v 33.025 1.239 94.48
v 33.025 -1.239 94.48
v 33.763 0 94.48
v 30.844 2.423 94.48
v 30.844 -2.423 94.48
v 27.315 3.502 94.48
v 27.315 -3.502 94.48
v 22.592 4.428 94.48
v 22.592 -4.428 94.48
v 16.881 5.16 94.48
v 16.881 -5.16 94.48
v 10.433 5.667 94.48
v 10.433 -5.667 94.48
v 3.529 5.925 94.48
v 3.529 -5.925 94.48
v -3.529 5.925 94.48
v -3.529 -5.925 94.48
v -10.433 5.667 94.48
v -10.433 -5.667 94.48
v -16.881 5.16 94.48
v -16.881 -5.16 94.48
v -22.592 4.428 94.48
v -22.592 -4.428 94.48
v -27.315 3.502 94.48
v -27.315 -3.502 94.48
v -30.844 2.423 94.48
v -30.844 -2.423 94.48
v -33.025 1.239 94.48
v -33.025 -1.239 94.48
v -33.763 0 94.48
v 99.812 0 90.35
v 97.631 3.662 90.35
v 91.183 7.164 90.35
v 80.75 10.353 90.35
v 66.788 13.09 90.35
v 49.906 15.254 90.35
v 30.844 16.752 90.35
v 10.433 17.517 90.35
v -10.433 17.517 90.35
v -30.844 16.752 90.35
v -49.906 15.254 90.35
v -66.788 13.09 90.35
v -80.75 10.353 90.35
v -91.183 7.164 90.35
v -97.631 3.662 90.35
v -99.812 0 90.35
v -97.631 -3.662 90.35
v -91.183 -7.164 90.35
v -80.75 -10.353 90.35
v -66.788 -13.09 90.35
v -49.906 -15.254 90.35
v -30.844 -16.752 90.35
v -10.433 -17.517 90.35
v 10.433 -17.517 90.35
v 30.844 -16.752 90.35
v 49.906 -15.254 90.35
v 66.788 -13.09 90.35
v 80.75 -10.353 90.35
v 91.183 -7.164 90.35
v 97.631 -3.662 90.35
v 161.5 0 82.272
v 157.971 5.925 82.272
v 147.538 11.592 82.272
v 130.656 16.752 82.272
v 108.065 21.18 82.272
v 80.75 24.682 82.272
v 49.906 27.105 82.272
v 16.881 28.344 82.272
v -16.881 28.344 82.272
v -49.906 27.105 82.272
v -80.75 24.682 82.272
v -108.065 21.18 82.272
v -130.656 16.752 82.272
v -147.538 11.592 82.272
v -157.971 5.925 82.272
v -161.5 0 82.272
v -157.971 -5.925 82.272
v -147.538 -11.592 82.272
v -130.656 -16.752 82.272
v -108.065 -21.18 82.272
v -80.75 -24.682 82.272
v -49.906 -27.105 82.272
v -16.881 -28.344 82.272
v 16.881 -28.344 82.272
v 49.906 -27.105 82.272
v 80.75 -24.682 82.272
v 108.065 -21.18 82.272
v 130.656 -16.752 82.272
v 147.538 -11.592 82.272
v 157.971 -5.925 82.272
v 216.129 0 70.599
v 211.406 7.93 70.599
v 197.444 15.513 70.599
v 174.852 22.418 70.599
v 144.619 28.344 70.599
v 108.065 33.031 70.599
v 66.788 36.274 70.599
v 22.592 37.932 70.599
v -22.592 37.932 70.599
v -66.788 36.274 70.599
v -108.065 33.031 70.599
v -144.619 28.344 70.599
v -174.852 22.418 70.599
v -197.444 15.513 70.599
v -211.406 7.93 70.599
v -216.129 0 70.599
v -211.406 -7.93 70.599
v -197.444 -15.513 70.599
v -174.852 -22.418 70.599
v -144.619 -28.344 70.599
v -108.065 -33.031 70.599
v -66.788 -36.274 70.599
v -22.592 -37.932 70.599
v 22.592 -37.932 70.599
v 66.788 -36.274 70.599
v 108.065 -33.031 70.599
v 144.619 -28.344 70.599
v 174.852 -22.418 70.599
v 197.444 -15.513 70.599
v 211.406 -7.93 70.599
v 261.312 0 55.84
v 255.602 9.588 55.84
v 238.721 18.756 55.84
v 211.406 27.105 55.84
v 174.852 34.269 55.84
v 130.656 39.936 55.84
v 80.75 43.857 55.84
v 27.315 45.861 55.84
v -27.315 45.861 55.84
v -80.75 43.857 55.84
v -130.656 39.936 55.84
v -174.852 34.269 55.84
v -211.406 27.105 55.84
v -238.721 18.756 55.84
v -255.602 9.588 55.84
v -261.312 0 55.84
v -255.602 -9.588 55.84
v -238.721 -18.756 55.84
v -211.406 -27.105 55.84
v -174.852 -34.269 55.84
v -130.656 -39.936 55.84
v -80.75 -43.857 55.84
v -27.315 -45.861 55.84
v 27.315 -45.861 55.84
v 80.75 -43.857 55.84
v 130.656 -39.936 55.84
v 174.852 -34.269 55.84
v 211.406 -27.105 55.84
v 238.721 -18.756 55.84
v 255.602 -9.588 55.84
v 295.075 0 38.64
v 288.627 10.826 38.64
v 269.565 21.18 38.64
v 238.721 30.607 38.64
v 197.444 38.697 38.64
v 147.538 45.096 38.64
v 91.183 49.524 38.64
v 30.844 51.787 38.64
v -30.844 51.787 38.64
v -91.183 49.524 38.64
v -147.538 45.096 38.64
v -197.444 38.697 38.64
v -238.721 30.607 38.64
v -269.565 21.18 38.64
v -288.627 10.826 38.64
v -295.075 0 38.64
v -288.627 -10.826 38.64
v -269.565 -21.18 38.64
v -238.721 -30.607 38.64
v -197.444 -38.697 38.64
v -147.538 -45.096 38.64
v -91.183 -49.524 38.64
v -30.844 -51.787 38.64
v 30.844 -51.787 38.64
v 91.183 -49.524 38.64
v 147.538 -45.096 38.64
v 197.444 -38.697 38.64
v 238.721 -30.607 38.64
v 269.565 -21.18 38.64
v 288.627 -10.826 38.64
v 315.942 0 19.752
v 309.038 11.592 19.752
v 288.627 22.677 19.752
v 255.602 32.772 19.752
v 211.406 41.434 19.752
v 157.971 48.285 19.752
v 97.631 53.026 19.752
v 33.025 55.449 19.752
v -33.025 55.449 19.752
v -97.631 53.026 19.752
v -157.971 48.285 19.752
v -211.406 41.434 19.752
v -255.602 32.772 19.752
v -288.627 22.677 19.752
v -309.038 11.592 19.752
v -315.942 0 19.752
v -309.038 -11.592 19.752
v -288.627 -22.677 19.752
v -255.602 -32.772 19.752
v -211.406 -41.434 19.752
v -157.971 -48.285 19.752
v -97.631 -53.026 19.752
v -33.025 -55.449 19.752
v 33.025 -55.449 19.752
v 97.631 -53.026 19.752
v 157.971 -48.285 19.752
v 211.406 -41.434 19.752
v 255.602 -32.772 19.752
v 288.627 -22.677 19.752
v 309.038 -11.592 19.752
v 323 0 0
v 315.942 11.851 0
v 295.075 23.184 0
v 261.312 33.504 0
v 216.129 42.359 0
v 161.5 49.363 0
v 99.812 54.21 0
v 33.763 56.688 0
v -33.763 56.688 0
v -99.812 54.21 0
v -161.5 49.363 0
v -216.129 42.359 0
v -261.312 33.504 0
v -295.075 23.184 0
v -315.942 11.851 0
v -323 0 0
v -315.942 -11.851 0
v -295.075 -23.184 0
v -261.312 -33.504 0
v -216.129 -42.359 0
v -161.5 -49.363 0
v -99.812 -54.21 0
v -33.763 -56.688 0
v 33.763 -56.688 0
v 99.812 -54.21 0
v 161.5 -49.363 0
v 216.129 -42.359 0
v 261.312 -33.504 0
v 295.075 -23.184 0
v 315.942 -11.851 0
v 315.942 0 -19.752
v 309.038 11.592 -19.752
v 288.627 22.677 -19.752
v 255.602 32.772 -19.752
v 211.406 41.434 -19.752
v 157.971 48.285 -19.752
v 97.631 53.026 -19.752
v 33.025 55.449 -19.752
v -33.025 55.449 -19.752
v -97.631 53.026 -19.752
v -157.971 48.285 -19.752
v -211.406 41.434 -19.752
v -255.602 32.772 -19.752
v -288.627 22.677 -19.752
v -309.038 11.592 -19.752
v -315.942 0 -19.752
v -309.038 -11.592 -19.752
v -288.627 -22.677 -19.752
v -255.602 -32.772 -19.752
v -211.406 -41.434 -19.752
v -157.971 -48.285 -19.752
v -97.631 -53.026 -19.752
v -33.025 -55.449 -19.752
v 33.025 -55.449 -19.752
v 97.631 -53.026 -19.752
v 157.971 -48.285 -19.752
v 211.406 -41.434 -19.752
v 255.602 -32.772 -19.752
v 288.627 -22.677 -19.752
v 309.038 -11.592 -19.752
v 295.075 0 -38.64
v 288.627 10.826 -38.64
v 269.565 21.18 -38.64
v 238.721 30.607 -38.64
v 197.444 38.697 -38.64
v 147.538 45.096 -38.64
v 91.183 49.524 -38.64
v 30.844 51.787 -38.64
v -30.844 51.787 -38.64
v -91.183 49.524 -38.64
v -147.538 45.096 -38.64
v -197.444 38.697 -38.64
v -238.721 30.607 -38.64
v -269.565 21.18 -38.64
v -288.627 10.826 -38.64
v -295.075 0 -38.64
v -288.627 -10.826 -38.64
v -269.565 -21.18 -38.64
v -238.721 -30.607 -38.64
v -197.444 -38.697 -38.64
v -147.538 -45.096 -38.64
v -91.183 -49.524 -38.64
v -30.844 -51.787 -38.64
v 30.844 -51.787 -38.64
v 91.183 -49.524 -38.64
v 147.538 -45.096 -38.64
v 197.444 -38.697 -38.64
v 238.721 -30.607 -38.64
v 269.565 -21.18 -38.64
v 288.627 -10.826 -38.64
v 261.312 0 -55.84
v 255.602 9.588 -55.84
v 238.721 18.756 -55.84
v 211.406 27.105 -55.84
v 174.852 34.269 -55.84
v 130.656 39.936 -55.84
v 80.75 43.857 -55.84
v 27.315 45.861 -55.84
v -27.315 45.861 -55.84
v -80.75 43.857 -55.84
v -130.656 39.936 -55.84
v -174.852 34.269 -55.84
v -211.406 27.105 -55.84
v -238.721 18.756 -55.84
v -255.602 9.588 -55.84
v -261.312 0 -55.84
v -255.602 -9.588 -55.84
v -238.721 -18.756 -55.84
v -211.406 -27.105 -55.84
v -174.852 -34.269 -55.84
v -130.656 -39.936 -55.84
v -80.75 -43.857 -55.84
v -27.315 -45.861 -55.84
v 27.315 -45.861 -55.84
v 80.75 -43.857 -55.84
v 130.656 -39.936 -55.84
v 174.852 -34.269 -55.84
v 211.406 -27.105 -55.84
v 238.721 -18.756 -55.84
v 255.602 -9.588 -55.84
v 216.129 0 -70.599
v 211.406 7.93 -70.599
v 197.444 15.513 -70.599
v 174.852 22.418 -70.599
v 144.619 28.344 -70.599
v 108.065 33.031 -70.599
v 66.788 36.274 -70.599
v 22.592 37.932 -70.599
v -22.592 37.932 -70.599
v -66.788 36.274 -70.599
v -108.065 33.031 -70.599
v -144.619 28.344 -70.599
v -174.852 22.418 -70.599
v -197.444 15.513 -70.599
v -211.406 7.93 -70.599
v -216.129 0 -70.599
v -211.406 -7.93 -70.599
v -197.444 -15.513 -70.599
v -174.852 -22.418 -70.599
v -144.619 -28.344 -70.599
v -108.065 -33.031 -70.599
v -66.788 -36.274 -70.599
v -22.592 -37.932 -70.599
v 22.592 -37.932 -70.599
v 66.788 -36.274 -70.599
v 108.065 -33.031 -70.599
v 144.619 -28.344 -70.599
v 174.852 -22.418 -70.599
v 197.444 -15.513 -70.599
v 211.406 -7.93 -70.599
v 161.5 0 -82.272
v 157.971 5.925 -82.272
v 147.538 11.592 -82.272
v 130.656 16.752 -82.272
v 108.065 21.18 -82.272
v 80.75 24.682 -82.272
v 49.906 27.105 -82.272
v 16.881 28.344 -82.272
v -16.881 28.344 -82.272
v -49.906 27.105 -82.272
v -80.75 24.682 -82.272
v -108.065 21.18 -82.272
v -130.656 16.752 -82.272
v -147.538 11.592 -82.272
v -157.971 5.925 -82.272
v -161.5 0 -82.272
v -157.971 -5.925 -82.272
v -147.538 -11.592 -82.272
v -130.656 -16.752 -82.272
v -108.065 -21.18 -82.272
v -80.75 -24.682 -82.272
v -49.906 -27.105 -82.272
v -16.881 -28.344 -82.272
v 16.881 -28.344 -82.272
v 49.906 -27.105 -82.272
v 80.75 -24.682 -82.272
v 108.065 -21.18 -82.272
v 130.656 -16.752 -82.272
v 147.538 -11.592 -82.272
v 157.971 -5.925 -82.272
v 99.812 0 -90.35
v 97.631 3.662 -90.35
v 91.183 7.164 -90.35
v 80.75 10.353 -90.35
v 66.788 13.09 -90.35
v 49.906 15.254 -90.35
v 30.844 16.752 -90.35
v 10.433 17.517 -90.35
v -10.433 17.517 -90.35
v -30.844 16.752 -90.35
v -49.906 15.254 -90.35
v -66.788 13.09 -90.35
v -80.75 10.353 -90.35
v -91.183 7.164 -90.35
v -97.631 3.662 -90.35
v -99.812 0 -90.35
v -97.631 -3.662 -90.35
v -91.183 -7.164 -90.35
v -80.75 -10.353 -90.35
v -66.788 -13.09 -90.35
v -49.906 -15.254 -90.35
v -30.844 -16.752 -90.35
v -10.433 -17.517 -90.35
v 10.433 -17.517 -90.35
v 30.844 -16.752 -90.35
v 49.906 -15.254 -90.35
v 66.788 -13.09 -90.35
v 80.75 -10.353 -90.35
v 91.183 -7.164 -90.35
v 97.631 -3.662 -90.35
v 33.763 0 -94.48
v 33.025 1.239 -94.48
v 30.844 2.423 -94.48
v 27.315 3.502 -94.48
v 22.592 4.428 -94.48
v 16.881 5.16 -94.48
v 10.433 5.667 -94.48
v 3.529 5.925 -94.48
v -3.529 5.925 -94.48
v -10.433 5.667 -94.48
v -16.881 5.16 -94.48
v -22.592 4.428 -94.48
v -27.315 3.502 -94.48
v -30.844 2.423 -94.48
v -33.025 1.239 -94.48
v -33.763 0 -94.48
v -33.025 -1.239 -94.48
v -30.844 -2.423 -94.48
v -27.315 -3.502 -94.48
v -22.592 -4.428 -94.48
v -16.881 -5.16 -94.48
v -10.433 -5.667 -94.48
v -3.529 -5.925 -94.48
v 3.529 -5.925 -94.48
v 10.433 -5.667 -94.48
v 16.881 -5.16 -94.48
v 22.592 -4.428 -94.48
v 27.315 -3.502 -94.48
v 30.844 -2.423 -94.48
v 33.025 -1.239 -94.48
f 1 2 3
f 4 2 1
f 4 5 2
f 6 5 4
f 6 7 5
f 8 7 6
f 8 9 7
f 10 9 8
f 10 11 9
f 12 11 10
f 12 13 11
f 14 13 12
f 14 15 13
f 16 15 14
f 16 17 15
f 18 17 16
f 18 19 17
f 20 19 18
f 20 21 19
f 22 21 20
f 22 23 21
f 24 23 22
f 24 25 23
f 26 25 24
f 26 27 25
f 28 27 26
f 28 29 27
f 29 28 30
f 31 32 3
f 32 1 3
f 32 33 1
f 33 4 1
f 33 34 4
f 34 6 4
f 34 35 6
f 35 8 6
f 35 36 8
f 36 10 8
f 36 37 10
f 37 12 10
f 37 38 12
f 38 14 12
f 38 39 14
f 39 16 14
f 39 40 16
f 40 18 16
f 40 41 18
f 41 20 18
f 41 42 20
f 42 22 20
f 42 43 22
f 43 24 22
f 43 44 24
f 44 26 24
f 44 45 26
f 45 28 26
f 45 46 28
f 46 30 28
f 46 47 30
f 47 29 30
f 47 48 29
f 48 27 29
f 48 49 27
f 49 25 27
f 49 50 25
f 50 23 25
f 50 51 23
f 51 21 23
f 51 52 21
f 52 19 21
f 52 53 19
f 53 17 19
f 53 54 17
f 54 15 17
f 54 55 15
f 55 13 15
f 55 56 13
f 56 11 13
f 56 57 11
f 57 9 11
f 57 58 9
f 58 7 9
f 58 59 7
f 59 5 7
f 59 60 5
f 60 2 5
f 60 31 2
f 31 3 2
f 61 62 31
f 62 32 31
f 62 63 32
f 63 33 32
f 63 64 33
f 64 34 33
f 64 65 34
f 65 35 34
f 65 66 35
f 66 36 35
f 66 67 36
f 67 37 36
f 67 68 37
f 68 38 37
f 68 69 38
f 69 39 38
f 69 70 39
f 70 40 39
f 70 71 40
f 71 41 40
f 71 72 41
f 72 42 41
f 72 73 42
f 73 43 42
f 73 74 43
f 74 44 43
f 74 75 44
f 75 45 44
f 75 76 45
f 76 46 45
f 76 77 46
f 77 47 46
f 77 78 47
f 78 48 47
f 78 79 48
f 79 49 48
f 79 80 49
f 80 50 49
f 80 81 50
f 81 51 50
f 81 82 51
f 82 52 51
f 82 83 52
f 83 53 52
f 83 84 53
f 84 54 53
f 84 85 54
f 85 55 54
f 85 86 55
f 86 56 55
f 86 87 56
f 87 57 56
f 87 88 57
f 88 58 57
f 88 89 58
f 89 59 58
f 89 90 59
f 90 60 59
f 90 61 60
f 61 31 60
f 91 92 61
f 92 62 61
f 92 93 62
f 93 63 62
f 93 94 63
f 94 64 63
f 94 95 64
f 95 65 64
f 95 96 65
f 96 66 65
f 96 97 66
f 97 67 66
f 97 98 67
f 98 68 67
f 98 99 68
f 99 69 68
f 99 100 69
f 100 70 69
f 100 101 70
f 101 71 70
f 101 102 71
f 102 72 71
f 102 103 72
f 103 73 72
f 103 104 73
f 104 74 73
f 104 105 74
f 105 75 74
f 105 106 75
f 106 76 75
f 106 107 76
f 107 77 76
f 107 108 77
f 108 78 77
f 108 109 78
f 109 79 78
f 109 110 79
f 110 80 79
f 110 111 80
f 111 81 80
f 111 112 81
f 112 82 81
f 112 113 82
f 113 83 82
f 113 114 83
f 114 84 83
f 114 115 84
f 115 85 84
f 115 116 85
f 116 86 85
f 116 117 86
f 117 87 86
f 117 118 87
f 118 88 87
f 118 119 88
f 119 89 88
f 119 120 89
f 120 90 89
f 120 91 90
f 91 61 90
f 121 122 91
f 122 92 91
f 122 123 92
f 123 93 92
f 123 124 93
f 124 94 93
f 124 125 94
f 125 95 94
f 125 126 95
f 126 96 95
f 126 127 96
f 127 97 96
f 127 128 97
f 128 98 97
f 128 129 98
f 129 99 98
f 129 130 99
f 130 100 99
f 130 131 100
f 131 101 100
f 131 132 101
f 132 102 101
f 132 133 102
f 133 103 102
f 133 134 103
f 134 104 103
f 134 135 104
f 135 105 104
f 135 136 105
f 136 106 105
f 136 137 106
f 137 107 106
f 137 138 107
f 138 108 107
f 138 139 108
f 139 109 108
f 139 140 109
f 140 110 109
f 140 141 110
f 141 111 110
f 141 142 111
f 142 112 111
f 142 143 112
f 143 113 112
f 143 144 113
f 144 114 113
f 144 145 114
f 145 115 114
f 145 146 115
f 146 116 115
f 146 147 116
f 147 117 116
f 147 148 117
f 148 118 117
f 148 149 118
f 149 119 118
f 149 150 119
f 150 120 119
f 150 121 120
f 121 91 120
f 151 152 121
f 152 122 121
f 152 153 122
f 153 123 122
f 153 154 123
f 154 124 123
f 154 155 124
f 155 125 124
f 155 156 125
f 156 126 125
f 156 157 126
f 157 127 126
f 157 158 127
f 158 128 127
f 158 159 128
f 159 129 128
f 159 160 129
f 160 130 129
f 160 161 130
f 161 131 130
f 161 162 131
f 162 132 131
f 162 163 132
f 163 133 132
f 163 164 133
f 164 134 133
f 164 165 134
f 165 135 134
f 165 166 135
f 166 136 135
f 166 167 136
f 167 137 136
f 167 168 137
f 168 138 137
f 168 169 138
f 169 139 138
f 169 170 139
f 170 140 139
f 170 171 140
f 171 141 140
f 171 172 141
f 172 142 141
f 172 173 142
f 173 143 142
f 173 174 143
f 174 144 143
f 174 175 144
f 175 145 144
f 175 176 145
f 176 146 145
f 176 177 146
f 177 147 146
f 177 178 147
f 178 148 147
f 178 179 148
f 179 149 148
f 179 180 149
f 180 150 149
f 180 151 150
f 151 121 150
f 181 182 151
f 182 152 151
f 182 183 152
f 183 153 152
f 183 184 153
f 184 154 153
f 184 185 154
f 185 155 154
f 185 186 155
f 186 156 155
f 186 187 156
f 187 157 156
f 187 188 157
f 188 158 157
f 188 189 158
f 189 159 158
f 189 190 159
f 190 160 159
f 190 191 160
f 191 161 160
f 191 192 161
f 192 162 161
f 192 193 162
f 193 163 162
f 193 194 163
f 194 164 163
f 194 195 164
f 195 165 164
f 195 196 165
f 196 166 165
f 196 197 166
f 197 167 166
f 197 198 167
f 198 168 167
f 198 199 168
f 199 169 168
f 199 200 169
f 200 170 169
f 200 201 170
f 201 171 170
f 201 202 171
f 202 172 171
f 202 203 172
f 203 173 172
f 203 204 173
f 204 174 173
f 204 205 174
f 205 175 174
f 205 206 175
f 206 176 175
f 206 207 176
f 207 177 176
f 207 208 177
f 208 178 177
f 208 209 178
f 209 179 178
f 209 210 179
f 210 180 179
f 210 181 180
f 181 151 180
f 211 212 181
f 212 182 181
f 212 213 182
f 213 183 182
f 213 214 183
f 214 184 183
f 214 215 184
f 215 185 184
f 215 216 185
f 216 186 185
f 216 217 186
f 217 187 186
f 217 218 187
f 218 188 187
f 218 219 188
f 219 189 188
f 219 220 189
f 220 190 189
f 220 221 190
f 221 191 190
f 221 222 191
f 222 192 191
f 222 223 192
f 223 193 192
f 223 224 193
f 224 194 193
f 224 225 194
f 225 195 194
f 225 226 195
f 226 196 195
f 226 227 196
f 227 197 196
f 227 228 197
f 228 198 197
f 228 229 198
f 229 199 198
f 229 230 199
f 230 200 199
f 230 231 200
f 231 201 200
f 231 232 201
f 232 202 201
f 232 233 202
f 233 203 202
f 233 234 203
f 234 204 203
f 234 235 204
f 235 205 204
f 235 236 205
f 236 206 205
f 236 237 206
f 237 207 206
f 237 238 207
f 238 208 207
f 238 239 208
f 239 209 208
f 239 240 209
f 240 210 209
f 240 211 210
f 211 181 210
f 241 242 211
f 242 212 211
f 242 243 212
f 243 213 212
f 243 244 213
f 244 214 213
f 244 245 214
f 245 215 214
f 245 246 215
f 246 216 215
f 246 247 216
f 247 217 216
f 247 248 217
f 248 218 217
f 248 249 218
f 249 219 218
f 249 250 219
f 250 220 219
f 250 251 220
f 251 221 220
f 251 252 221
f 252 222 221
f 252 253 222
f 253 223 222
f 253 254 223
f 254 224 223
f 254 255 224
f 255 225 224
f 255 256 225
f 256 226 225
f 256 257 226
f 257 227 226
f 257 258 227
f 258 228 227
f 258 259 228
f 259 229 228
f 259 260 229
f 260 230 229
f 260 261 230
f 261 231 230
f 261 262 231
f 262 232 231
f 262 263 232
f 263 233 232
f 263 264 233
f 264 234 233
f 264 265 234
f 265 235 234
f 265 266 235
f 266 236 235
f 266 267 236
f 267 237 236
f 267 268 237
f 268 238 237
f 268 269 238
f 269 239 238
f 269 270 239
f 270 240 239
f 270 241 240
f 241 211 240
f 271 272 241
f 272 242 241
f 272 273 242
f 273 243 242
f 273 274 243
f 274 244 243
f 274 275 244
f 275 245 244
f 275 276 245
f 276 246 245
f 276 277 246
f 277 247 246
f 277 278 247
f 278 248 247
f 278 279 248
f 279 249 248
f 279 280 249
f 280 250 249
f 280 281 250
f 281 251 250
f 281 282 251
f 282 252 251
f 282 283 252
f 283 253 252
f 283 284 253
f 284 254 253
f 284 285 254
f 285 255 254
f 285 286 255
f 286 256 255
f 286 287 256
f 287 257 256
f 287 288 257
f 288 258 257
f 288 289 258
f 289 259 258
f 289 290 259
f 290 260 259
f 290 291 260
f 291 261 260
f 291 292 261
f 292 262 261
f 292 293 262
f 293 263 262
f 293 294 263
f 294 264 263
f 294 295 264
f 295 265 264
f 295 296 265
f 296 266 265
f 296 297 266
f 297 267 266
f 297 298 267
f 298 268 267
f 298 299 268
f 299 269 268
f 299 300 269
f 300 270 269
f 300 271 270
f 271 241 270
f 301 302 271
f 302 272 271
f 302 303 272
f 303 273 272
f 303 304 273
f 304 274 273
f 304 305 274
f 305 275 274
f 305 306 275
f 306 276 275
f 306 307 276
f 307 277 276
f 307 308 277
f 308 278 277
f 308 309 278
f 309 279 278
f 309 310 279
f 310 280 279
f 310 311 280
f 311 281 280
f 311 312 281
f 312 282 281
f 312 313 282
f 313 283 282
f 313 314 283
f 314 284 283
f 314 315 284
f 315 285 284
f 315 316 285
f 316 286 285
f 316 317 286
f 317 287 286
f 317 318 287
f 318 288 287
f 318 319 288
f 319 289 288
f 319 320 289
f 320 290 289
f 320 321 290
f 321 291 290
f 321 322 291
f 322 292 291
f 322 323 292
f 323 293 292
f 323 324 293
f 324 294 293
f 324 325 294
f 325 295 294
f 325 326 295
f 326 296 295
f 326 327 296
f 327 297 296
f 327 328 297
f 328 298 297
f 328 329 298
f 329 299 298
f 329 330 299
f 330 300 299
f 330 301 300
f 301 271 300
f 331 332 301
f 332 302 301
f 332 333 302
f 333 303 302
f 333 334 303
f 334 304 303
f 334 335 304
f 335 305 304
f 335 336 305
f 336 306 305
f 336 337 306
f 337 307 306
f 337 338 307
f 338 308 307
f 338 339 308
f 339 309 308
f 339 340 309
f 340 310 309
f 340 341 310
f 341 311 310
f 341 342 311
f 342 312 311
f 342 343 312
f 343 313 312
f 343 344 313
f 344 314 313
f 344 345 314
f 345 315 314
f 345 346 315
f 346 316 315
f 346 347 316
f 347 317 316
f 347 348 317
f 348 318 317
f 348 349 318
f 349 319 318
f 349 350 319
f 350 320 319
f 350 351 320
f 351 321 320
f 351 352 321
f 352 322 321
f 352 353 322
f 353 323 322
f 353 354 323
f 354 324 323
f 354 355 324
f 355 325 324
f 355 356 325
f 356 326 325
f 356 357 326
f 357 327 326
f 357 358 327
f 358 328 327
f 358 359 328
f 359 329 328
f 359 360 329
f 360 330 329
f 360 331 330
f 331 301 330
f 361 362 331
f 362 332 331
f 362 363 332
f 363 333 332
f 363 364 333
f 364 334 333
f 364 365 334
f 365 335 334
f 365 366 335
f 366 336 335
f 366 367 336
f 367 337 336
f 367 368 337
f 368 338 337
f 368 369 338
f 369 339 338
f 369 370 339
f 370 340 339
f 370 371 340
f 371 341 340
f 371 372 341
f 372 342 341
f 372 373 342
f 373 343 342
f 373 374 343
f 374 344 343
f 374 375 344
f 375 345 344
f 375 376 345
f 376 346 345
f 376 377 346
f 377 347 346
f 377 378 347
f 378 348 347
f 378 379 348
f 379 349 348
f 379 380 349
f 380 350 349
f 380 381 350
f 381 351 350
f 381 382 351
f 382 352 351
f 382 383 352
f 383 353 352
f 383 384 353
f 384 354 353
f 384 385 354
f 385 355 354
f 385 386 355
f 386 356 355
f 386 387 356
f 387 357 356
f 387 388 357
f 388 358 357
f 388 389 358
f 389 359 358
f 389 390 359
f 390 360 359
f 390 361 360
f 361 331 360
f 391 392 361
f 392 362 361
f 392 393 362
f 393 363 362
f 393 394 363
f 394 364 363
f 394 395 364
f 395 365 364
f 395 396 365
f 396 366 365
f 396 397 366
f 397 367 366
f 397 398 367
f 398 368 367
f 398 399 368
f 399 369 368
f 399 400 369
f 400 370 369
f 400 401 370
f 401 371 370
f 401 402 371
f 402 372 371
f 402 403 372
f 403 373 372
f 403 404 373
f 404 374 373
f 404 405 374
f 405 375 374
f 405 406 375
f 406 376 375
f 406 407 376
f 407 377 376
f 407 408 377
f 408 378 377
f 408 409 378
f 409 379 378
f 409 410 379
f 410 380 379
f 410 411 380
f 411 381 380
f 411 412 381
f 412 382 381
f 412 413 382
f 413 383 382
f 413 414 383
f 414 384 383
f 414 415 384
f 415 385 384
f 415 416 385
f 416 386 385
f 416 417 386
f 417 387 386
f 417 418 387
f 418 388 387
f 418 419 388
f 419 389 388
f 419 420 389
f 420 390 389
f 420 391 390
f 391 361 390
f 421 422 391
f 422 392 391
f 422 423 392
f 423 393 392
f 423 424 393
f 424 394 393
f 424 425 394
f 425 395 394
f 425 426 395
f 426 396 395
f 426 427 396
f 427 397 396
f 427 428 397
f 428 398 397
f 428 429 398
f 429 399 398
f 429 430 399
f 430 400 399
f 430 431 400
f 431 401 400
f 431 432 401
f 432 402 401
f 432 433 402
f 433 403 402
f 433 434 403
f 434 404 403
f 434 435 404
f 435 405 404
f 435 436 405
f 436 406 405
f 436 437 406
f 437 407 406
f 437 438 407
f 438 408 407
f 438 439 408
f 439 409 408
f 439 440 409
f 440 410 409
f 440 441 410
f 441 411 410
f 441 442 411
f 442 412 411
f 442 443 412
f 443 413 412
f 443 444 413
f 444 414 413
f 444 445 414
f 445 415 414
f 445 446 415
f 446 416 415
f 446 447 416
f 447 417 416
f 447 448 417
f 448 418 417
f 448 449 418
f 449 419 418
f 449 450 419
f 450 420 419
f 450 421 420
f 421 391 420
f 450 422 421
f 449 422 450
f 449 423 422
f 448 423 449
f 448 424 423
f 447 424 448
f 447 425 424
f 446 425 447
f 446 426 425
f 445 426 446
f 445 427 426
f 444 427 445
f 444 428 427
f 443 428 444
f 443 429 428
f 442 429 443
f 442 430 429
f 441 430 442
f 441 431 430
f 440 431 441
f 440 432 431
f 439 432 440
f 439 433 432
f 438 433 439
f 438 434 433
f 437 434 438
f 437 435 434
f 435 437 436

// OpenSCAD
// Generated by SolidPython 1.0.1 on 2020-07-29 00:46:52


scale(v = [17, 3, 5]) {
	sphere(r = 19);
}
/***********************************************
*********      SolidPython code:      **********
************************************************
 
# import packages: SolidPython
from solid import *
from solid.utils import *
from itertools import chain, combinations, permutations


class Resize:

    def __init__(self, scad_file):
        self.scad_file = scad_file
        #self.scad_file = import_scad(scad_file)
        # cone/cylinder param:
        self.r1 = 0
        self.r2 = 0
        self.h = 0
        # rectangular prism param:
        self.w = 0
        self.l = 0
        # ellipse param:
        self.r = 0

    # import OpenScad code (file name corresponds to shape)


    # classify shape + parameters
    def assign(self, param1, param2, param3):
        if self.scad_file == 'cone.scad':
            self.r1 = param1
            self.r2 = param2
            self.h = param3
        elif self.scad_file == 'cylinder.scad':
            self.r1 = param1
            self.r2 = param2
            self.h = param3
        elif self.scad_file == 'rectangularPrism.scad':
            self.h = param1
            self.l = param2
            self.w = param3
        else:
            self.r = param1
            self.h = param2

    # resize parameters
    def iterate(self):
        x = range(3, 20, 2)
        i = 1
        if self.scad_file == 'cone.scad':
            tempList = list(permutations(x, 2))
            for temp in tempList:
                param1 = temp[0]
                param2 = temp[1]
                filepath = 'produced_scad_files/' + 'cone' + str(param1) + '_' + str(param2) + '_' + '.scad'
                scad_render_to_file(cylinder(h=param1, r1=param2, r2=0), filepath)

        elif self.scad_file == 'cylinder.scad':
            tempList = list(permutations(x, 3))
            for temp in tempList:
                param1 = temp[0]
                param2 = temp[1]
                filepath = 'produced_scad_files/' + 'cylinder' + str(param1) + '_' + str(param2) + '_' + '.scad'
                scad_render_to_file(cylinder(h=param1, r1=param2, r2=param2), filepath)

        elif self.scad_file == 'rectangularPrism.scad':
            tempList = list(permutations(x, 3))
            for temp in tempList:
                param1 = temp[0]
                param2 = temp[1]
                param3 = temp[2]
                filepath = 'produced_scad_files/' + 'rectangularPrism' + str(param1) + '_' + str(param2) + '_' + str(
                    param3) + '.scad'
                scad_render_to_file(cube(size=(param1, param2, param3)), filepath)

        elif self.scad_file == 'ellipse.scad':
            tempList = list(permutations(x, 4))
            for temp in tempList:
                param1 = temp[0]
                param2 = temp[1]
                param3 = temp[2]
                param4 = temp[3]
                filepath = 'produced_scad_files/' + 'ellipse' + str(param1) + '_' + str(param2) + '_' + str(param3) + '_' + str(param4) + '.scad'
                scad_render_to_file(scale([param1, param2, param3])(sphere(r=param4)), filepath)

    def render_to_scadfile(self):
        scad_render_to_file(scad, 'example.scad') 
 
************************************************/
